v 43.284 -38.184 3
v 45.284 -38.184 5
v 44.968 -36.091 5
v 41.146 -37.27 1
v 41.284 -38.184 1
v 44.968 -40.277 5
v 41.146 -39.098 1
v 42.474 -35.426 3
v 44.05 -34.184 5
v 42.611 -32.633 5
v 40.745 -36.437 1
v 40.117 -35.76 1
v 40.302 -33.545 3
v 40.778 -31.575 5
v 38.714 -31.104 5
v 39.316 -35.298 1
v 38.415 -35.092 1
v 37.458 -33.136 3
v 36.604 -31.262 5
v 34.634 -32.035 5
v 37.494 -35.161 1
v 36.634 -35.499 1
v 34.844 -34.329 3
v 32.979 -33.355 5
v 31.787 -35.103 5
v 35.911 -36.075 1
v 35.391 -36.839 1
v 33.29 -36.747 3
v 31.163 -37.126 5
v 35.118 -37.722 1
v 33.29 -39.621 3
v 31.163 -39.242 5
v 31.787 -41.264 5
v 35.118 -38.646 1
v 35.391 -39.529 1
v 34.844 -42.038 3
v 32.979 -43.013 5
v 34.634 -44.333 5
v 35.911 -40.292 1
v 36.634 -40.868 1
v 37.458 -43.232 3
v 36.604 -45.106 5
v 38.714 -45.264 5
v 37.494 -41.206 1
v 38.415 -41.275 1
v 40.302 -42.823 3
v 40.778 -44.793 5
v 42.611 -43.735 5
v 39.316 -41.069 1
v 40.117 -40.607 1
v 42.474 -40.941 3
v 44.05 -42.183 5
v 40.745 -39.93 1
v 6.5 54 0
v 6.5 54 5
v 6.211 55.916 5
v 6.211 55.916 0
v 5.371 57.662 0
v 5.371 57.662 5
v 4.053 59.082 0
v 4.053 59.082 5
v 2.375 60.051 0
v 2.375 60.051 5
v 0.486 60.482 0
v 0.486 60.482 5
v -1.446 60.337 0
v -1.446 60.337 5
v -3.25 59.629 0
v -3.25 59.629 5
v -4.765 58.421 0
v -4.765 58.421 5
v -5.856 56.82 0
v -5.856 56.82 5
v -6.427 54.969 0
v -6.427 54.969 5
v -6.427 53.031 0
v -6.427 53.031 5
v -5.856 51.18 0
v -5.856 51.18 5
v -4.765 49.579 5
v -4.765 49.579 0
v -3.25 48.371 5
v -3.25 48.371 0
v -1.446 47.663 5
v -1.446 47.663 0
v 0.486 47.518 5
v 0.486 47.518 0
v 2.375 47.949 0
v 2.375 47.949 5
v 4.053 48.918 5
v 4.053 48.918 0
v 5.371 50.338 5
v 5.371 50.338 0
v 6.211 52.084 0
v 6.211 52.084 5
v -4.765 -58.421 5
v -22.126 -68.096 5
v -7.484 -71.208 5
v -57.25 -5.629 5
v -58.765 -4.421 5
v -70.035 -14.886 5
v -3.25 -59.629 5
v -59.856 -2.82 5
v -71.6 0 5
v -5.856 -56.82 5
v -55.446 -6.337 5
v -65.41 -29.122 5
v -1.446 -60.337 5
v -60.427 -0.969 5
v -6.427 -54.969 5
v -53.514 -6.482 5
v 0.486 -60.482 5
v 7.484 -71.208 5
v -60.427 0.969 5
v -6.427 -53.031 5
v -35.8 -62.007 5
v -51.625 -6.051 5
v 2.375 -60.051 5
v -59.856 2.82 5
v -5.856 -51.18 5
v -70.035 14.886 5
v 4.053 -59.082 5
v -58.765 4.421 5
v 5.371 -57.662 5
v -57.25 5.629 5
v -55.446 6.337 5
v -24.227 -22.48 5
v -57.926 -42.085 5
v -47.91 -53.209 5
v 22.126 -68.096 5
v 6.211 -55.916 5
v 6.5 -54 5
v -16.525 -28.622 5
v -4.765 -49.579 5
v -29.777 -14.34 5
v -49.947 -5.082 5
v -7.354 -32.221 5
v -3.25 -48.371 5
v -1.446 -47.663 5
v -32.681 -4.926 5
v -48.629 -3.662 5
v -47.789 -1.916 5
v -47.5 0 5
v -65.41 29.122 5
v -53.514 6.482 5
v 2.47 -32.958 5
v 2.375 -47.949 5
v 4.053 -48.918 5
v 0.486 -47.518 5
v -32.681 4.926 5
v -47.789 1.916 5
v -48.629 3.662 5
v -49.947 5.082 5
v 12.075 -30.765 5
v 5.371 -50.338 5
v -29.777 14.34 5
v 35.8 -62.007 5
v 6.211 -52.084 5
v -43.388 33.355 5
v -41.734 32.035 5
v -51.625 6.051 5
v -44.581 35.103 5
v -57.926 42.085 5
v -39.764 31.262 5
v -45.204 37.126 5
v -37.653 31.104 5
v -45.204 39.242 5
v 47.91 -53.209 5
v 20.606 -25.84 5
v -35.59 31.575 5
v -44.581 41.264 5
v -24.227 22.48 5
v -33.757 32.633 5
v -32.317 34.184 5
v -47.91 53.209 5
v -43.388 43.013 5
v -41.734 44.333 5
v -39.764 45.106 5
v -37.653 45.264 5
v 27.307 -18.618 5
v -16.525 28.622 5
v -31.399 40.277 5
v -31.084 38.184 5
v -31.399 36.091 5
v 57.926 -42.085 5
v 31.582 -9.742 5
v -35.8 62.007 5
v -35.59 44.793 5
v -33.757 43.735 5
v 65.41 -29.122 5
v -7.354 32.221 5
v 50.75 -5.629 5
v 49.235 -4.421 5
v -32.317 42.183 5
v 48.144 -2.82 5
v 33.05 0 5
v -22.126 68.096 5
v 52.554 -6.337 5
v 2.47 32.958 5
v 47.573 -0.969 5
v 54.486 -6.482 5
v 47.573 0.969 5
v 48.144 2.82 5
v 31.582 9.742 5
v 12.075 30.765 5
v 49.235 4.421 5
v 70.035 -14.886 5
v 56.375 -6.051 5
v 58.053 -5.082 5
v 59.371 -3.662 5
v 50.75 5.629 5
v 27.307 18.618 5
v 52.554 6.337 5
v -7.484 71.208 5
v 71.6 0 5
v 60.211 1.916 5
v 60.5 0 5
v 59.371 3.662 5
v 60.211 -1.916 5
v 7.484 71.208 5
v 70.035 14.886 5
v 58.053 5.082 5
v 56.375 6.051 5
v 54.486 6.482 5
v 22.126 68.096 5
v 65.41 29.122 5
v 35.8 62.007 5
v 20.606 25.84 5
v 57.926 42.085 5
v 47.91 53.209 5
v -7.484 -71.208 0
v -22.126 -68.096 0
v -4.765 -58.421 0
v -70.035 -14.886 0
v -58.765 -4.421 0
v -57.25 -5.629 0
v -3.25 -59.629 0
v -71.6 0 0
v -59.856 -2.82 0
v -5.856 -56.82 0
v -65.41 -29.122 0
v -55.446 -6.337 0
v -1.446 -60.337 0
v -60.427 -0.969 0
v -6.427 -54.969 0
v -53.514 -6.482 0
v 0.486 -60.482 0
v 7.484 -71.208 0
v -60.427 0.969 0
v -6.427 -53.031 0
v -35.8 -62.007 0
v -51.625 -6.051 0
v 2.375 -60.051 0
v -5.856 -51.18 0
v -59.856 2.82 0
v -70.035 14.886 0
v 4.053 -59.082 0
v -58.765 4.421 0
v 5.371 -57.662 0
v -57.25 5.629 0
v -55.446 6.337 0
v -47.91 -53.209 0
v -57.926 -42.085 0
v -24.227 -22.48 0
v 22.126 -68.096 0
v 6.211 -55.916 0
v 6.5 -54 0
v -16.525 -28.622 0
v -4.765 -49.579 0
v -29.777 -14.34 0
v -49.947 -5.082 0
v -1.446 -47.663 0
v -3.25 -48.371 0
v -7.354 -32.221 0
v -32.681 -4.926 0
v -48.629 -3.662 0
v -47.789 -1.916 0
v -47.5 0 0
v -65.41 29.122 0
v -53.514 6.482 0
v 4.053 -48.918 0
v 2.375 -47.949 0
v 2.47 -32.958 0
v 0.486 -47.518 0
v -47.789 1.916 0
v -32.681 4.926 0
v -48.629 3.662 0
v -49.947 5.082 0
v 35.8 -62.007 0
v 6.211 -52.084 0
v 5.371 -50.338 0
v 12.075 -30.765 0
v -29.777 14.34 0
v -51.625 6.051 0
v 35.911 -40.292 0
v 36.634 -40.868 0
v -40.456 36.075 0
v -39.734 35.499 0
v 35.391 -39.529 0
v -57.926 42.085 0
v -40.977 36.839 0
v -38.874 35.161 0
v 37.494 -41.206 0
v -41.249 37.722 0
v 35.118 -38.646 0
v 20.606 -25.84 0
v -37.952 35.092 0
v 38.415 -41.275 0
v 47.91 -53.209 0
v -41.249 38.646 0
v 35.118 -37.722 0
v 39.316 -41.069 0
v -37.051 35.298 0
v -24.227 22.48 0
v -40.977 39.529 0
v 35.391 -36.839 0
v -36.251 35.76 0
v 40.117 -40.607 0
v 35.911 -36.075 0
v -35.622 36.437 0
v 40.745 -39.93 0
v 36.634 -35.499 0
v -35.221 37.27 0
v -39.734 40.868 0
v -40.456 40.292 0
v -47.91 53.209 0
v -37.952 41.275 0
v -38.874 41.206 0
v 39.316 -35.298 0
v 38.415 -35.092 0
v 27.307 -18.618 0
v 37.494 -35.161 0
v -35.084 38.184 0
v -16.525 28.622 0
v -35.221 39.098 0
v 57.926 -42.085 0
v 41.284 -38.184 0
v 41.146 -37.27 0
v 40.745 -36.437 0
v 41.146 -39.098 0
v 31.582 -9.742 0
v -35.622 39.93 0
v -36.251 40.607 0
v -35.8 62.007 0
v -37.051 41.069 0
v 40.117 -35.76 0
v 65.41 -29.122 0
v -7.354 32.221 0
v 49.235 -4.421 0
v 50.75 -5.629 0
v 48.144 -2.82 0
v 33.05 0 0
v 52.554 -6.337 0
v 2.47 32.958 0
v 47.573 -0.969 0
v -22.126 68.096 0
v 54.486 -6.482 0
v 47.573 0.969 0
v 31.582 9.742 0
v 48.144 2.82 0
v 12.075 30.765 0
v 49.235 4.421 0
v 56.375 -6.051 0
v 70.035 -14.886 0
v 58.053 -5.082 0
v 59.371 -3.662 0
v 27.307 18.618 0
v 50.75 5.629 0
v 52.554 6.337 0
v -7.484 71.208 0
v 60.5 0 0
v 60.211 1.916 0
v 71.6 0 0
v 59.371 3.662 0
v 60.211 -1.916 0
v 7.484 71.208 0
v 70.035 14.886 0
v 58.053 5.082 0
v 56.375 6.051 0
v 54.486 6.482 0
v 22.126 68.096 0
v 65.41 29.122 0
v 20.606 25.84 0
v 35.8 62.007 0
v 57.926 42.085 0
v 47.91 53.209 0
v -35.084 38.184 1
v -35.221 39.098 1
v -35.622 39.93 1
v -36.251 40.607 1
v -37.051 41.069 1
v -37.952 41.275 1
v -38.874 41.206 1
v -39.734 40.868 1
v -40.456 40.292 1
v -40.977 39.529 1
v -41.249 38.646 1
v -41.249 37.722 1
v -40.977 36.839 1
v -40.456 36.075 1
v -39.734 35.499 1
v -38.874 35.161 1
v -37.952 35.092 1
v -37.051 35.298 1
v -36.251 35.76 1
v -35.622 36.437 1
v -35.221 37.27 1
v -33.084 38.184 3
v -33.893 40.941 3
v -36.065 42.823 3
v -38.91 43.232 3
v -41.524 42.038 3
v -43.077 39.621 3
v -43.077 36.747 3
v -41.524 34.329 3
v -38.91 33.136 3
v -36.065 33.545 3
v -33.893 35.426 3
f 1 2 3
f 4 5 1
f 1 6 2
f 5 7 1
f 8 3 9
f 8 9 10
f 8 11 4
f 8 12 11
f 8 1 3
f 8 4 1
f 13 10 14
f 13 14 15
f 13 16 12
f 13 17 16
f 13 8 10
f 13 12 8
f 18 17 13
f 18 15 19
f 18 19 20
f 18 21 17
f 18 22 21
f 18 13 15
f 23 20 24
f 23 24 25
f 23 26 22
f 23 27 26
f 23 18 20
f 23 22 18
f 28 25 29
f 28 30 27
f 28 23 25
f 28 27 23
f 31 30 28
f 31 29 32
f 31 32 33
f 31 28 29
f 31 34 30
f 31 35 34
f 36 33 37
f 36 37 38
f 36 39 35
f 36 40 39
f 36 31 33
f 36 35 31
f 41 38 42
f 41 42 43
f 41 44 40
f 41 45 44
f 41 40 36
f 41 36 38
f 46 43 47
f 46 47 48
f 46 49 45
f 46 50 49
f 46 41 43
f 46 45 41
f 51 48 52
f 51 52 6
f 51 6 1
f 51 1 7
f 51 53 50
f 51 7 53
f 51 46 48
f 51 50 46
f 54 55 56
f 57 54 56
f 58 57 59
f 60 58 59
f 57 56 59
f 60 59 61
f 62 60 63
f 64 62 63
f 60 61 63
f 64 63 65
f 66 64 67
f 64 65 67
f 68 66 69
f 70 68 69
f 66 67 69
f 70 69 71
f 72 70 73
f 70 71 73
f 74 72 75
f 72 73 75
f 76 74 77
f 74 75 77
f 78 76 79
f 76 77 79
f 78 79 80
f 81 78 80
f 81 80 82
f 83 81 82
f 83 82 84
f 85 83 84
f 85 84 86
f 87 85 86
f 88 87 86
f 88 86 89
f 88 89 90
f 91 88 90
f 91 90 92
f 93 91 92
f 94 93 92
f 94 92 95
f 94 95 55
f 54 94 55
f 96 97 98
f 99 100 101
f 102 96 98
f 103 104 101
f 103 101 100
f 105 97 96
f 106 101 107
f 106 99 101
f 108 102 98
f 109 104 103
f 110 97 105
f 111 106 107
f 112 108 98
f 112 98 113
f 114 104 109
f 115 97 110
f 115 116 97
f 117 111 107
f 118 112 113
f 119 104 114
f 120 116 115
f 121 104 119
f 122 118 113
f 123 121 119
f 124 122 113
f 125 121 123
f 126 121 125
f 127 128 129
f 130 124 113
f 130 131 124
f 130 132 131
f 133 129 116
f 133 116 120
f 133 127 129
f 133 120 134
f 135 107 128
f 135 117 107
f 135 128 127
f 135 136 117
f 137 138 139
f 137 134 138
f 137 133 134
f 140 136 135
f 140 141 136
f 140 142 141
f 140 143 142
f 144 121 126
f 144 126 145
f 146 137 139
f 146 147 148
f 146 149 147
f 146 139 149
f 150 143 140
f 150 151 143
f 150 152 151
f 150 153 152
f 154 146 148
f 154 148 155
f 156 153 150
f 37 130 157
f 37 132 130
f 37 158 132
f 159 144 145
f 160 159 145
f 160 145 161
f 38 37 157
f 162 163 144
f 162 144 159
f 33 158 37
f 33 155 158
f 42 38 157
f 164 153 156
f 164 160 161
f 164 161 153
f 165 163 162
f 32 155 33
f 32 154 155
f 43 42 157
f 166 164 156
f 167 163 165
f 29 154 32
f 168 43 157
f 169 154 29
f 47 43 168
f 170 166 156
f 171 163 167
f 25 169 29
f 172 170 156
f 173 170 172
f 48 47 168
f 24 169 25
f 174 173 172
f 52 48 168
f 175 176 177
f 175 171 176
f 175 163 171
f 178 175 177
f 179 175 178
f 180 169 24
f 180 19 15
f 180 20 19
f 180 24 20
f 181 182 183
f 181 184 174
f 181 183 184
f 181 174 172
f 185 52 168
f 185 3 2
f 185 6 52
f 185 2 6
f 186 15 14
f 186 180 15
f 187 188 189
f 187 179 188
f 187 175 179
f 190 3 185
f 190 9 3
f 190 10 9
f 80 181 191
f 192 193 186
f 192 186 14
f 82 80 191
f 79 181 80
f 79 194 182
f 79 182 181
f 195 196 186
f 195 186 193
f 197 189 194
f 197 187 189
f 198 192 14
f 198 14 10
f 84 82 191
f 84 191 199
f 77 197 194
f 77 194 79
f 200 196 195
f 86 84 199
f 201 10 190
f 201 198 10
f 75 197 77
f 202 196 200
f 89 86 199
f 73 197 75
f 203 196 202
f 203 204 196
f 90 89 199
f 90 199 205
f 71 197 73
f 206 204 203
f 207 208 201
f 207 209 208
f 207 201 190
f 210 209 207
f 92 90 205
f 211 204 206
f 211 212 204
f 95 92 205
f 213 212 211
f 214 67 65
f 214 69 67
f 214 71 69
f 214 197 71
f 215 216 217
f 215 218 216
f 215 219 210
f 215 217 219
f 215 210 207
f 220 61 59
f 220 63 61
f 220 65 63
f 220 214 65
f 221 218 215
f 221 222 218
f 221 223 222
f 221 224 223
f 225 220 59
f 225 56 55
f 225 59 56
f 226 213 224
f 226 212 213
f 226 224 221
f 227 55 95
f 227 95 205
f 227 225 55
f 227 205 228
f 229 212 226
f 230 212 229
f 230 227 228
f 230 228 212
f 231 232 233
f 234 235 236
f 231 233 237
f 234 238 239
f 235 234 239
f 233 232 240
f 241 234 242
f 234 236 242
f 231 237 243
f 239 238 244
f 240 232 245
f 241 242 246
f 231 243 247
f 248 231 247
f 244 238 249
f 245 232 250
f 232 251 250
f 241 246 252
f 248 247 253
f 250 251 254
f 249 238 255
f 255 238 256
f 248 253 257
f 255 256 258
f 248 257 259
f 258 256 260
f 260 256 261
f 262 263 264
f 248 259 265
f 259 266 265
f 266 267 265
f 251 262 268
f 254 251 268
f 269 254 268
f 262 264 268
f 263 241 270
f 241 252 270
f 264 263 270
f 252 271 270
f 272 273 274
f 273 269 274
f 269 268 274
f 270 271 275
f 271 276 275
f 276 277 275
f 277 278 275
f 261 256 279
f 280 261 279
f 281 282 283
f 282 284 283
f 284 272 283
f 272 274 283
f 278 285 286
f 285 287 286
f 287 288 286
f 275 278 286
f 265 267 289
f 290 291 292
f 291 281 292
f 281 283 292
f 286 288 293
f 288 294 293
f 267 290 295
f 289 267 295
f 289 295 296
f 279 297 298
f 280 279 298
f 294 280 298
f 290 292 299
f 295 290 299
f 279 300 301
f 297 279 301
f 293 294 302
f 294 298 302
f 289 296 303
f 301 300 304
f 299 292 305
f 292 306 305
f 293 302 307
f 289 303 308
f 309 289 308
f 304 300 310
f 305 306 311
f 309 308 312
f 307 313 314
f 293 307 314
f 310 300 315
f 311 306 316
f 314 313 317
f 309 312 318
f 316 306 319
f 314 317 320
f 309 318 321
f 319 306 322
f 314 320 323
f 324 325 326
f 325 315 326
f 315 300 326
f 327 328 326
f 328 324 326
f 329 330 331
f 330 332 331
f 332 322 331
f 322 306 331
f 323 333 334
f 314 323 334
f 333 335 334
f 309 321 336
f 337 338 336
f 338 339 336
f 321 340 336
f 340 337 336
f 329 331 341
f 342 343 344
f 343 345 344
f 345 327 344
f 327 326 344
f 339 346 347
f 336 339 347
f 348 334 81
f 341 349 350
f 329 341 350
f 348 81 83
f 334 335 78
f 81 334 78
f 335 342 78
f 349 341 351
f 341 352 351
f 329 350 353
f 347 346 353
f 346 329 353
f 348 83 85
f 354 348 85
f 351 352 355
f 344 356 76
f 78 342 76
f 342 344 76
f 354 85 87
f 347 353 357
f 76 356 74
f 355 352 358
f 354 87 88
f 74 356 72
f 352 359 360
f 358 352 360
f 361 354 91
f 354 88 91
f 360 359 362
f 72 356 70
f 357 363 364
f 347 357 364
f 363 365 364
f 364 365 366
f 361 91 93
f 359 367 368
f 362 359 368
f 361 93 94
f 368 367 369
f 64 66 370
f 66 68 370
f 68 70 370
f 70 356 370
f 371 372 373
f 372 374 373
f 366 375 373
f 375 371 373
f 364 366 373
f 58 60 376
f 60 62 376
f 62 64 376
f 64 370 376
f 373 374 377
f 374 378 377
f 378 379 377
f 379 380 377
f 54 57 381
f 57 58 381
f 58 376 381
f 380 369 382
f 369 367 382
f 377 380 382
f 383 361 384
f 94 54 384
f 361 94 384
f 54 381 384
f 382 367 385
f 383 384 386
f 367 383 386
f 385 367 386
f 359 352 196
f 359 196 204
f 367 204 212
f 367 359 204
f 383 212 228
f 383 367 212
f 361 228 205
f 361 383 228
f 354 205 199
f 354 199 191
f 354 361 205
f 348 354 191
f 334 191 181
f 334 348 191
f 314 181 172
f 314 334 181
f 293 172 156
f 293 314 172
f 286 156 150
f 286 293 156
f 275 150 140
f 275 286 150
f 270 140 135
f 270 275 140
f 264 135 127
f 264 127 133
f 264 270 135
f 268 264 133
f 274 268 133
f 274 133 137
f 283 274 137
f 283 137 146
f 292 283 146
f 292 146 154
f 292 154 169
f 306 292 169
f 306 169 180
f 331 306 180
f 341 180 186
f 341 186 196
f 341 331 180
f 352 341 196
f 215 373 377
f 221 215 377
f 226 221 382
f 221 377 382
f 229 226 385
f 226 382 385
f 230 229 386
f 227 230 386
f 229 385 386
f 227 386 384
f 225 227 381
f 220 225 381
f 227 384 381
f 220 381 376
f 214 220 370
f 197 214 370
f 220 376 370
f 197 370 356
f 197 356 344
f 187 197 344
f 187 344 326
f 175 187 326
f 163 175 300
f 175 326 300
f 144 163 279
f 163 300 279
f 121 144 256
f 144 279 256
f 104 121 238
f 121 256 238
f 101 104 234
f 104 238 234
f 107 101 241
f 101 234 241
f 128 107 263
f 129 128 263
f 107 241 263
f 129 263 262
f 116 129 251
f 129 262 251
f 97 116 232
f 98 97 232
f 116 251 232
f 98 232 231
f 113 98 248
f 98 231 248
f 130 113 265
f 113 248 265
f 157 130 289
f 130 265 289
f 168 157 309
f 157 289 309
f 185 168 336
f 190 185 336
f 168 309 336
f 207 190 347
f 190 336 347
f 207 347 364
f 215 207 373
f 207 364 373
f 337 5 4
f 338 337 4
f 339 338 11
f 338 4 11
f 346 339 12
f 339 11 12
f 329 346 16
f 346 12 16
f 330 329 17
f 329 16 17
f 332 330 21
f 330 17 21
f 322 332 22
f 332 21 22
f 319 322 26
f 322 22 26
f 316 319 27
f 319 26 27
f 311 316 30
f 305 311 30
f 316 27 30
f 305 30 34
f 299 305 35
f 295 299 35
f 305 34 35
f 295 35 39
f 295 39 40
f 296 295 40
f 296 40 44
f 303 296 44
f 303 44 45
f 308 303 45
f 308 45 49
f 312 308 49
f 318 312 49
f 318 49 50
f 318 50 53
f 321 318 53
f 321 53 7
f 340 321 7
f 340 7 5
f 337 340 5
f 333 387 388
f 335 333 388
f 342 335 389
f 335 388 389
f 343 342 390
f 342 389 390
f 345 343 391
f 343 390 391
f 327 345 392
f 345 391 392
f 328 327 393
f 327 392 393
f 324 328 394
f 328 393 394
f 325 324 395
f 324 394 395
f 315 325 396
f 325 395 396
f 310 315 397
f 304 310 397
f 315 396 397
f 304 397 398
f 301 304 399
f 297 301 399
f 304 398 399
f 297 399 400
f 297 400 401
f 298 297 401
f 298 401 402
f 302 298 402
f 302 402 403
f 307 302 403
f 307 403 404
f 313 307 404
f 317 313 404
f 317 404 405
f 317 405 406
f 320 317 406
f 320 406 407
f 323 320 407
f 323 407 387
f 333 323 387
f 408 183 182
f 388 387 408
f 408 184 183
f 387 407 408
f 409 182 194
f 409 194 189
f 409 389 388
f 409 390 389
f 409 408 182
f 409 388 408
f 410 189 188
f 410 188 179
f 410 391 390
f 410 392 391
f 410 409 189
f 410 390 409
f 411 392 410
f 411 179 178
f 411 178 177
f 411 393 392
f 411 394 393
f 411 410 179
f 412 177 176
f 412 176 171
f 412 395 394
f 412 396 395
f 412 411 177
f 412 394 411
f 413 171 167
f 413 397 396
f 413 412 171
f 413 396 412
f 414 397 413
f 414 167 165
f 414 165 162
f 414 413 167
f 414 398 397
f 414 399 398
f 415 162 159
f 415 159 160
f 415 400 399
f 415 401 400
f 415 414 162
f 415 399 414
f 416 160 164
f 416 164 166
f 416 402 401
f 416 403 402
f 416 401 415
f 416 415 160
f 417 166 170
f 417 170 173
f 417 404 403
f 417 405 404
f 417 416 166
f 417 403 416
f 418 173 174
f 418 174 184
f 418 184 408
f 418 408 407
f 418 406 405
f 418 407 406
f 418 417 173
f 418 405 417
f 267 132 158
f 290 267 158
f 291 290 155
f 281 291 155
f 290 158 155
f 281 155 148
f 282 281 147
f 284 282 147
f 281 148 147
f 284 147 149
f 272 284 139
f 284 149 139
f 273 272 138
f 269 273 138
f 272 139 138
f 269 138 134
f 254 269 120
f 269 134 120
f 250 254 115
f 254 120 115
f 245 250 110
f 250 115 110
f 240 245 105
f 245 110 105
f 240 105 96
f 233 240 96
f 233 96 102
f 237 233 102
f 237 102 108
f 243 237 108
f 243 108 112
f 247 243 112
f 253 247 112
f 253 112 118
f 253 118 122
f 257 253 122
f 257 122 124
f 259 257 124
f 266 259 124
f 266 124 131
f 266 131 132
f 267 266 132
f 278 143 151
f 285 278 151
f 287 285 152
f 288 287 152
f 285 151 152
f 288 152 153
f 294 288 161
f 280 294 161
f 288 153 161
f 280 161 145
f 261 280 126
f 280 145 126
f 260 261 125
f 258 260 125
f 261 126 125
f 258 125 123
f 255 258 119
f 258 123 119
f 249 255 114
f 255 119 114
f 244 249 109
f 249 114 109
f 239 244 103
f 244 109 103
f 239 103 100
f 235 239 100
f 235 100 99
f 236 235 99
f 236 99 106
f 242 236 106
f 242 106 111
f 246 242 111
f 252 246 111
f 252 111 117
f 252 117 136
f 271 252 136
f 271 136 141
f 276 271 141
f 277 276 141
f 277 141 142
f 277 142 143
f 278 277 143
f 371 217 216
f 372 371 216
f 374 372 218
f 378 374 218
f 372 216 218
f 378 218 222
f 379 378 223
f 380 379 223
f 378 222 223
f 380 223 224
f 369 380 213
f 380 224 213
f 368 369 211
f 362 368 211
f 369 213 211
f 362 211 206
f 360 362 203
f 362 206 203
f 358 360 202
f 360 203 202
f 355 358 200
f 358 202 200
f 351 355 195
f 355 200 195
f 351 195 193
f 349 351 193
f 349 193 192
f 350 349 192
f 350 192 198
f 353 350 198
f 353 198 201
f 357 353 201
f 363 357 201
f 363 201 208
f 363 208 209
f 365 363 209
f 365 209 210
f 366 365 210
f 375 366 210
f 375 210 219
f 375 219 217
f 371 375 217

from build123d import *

# Parameters (mm, degrees)
ESQUISSE1_R             = 71.6
ESQUISSE1_R_2           = 33.05
BOSS_EXTRU_1_DEPTH      = 5
ESQUISSE2_R             = 6.5
ENL_V_MAT_EXTRU_1_DEPTH = 6
ESQUISSE3_R             = 3.1
ENL_V_MAT_EXTRU_2_DEPTH = 6
CHANFREIN1_SIZE         = 4


with BuildPart() as part:
    # Esquisse1 → Boss.-Extru.1 (new body)
    with BuildSketch(Plane.XY):
        Circle(ESQUISSE1_R)
        Circle(ESQUISSE1_R_2, mode=Mode.SUBTRACT)
    extrude(amount=BOSS_EXTRU_1_DEPTH)

    # Esquisse2 → Enlèv. mat.-Extru.1 (cut, through all)
    with BuildSketch(Plane.XY.offset(5)):
        with Locations((0, 54)):
            Circle(ESQUISSE2_R)
        with Locations((54, 0)):
            Circle(ESQUISSE2_R)
        with Locations((-54, 0)):
            Circle(ESQUISSE2_R)
        with Locations((0, -54)):
            Circle(ESQUISSE2_R)
    extrude(amount=-ENL_V_MAT_EXTRU_1_DEPTH, mode=Mode.SUBTRACT)

    # Esquisse3 → Enlèv. mat.-Extru.2 (cut, through all)
    with BuildSketch(Plane.XY.offset(5)):
        with Locations((-38.183766184, 38.183766184)):
            Circle(ESQUISSE3_R)
        with Locations((38.183766184, -38.183766184)):
            Circle(ESQUISSE3_R)
    extrude(amount=-ENL_V_MAT_EXTRU_2_DEPTH, mode=Mode.SUBTRACT)

    # Chanfrein1
    chanfrein1_edges = [part.edges().sort_by_distance(p)[0] for p in [
        (-41.283766184, 38.183766184, 5),
        (35.083766184, -38.183766184, 5),
    ]]
    chamfer(chanfrein1_edges, length=CHANFREIN1_SIZE)


solid = part.part
